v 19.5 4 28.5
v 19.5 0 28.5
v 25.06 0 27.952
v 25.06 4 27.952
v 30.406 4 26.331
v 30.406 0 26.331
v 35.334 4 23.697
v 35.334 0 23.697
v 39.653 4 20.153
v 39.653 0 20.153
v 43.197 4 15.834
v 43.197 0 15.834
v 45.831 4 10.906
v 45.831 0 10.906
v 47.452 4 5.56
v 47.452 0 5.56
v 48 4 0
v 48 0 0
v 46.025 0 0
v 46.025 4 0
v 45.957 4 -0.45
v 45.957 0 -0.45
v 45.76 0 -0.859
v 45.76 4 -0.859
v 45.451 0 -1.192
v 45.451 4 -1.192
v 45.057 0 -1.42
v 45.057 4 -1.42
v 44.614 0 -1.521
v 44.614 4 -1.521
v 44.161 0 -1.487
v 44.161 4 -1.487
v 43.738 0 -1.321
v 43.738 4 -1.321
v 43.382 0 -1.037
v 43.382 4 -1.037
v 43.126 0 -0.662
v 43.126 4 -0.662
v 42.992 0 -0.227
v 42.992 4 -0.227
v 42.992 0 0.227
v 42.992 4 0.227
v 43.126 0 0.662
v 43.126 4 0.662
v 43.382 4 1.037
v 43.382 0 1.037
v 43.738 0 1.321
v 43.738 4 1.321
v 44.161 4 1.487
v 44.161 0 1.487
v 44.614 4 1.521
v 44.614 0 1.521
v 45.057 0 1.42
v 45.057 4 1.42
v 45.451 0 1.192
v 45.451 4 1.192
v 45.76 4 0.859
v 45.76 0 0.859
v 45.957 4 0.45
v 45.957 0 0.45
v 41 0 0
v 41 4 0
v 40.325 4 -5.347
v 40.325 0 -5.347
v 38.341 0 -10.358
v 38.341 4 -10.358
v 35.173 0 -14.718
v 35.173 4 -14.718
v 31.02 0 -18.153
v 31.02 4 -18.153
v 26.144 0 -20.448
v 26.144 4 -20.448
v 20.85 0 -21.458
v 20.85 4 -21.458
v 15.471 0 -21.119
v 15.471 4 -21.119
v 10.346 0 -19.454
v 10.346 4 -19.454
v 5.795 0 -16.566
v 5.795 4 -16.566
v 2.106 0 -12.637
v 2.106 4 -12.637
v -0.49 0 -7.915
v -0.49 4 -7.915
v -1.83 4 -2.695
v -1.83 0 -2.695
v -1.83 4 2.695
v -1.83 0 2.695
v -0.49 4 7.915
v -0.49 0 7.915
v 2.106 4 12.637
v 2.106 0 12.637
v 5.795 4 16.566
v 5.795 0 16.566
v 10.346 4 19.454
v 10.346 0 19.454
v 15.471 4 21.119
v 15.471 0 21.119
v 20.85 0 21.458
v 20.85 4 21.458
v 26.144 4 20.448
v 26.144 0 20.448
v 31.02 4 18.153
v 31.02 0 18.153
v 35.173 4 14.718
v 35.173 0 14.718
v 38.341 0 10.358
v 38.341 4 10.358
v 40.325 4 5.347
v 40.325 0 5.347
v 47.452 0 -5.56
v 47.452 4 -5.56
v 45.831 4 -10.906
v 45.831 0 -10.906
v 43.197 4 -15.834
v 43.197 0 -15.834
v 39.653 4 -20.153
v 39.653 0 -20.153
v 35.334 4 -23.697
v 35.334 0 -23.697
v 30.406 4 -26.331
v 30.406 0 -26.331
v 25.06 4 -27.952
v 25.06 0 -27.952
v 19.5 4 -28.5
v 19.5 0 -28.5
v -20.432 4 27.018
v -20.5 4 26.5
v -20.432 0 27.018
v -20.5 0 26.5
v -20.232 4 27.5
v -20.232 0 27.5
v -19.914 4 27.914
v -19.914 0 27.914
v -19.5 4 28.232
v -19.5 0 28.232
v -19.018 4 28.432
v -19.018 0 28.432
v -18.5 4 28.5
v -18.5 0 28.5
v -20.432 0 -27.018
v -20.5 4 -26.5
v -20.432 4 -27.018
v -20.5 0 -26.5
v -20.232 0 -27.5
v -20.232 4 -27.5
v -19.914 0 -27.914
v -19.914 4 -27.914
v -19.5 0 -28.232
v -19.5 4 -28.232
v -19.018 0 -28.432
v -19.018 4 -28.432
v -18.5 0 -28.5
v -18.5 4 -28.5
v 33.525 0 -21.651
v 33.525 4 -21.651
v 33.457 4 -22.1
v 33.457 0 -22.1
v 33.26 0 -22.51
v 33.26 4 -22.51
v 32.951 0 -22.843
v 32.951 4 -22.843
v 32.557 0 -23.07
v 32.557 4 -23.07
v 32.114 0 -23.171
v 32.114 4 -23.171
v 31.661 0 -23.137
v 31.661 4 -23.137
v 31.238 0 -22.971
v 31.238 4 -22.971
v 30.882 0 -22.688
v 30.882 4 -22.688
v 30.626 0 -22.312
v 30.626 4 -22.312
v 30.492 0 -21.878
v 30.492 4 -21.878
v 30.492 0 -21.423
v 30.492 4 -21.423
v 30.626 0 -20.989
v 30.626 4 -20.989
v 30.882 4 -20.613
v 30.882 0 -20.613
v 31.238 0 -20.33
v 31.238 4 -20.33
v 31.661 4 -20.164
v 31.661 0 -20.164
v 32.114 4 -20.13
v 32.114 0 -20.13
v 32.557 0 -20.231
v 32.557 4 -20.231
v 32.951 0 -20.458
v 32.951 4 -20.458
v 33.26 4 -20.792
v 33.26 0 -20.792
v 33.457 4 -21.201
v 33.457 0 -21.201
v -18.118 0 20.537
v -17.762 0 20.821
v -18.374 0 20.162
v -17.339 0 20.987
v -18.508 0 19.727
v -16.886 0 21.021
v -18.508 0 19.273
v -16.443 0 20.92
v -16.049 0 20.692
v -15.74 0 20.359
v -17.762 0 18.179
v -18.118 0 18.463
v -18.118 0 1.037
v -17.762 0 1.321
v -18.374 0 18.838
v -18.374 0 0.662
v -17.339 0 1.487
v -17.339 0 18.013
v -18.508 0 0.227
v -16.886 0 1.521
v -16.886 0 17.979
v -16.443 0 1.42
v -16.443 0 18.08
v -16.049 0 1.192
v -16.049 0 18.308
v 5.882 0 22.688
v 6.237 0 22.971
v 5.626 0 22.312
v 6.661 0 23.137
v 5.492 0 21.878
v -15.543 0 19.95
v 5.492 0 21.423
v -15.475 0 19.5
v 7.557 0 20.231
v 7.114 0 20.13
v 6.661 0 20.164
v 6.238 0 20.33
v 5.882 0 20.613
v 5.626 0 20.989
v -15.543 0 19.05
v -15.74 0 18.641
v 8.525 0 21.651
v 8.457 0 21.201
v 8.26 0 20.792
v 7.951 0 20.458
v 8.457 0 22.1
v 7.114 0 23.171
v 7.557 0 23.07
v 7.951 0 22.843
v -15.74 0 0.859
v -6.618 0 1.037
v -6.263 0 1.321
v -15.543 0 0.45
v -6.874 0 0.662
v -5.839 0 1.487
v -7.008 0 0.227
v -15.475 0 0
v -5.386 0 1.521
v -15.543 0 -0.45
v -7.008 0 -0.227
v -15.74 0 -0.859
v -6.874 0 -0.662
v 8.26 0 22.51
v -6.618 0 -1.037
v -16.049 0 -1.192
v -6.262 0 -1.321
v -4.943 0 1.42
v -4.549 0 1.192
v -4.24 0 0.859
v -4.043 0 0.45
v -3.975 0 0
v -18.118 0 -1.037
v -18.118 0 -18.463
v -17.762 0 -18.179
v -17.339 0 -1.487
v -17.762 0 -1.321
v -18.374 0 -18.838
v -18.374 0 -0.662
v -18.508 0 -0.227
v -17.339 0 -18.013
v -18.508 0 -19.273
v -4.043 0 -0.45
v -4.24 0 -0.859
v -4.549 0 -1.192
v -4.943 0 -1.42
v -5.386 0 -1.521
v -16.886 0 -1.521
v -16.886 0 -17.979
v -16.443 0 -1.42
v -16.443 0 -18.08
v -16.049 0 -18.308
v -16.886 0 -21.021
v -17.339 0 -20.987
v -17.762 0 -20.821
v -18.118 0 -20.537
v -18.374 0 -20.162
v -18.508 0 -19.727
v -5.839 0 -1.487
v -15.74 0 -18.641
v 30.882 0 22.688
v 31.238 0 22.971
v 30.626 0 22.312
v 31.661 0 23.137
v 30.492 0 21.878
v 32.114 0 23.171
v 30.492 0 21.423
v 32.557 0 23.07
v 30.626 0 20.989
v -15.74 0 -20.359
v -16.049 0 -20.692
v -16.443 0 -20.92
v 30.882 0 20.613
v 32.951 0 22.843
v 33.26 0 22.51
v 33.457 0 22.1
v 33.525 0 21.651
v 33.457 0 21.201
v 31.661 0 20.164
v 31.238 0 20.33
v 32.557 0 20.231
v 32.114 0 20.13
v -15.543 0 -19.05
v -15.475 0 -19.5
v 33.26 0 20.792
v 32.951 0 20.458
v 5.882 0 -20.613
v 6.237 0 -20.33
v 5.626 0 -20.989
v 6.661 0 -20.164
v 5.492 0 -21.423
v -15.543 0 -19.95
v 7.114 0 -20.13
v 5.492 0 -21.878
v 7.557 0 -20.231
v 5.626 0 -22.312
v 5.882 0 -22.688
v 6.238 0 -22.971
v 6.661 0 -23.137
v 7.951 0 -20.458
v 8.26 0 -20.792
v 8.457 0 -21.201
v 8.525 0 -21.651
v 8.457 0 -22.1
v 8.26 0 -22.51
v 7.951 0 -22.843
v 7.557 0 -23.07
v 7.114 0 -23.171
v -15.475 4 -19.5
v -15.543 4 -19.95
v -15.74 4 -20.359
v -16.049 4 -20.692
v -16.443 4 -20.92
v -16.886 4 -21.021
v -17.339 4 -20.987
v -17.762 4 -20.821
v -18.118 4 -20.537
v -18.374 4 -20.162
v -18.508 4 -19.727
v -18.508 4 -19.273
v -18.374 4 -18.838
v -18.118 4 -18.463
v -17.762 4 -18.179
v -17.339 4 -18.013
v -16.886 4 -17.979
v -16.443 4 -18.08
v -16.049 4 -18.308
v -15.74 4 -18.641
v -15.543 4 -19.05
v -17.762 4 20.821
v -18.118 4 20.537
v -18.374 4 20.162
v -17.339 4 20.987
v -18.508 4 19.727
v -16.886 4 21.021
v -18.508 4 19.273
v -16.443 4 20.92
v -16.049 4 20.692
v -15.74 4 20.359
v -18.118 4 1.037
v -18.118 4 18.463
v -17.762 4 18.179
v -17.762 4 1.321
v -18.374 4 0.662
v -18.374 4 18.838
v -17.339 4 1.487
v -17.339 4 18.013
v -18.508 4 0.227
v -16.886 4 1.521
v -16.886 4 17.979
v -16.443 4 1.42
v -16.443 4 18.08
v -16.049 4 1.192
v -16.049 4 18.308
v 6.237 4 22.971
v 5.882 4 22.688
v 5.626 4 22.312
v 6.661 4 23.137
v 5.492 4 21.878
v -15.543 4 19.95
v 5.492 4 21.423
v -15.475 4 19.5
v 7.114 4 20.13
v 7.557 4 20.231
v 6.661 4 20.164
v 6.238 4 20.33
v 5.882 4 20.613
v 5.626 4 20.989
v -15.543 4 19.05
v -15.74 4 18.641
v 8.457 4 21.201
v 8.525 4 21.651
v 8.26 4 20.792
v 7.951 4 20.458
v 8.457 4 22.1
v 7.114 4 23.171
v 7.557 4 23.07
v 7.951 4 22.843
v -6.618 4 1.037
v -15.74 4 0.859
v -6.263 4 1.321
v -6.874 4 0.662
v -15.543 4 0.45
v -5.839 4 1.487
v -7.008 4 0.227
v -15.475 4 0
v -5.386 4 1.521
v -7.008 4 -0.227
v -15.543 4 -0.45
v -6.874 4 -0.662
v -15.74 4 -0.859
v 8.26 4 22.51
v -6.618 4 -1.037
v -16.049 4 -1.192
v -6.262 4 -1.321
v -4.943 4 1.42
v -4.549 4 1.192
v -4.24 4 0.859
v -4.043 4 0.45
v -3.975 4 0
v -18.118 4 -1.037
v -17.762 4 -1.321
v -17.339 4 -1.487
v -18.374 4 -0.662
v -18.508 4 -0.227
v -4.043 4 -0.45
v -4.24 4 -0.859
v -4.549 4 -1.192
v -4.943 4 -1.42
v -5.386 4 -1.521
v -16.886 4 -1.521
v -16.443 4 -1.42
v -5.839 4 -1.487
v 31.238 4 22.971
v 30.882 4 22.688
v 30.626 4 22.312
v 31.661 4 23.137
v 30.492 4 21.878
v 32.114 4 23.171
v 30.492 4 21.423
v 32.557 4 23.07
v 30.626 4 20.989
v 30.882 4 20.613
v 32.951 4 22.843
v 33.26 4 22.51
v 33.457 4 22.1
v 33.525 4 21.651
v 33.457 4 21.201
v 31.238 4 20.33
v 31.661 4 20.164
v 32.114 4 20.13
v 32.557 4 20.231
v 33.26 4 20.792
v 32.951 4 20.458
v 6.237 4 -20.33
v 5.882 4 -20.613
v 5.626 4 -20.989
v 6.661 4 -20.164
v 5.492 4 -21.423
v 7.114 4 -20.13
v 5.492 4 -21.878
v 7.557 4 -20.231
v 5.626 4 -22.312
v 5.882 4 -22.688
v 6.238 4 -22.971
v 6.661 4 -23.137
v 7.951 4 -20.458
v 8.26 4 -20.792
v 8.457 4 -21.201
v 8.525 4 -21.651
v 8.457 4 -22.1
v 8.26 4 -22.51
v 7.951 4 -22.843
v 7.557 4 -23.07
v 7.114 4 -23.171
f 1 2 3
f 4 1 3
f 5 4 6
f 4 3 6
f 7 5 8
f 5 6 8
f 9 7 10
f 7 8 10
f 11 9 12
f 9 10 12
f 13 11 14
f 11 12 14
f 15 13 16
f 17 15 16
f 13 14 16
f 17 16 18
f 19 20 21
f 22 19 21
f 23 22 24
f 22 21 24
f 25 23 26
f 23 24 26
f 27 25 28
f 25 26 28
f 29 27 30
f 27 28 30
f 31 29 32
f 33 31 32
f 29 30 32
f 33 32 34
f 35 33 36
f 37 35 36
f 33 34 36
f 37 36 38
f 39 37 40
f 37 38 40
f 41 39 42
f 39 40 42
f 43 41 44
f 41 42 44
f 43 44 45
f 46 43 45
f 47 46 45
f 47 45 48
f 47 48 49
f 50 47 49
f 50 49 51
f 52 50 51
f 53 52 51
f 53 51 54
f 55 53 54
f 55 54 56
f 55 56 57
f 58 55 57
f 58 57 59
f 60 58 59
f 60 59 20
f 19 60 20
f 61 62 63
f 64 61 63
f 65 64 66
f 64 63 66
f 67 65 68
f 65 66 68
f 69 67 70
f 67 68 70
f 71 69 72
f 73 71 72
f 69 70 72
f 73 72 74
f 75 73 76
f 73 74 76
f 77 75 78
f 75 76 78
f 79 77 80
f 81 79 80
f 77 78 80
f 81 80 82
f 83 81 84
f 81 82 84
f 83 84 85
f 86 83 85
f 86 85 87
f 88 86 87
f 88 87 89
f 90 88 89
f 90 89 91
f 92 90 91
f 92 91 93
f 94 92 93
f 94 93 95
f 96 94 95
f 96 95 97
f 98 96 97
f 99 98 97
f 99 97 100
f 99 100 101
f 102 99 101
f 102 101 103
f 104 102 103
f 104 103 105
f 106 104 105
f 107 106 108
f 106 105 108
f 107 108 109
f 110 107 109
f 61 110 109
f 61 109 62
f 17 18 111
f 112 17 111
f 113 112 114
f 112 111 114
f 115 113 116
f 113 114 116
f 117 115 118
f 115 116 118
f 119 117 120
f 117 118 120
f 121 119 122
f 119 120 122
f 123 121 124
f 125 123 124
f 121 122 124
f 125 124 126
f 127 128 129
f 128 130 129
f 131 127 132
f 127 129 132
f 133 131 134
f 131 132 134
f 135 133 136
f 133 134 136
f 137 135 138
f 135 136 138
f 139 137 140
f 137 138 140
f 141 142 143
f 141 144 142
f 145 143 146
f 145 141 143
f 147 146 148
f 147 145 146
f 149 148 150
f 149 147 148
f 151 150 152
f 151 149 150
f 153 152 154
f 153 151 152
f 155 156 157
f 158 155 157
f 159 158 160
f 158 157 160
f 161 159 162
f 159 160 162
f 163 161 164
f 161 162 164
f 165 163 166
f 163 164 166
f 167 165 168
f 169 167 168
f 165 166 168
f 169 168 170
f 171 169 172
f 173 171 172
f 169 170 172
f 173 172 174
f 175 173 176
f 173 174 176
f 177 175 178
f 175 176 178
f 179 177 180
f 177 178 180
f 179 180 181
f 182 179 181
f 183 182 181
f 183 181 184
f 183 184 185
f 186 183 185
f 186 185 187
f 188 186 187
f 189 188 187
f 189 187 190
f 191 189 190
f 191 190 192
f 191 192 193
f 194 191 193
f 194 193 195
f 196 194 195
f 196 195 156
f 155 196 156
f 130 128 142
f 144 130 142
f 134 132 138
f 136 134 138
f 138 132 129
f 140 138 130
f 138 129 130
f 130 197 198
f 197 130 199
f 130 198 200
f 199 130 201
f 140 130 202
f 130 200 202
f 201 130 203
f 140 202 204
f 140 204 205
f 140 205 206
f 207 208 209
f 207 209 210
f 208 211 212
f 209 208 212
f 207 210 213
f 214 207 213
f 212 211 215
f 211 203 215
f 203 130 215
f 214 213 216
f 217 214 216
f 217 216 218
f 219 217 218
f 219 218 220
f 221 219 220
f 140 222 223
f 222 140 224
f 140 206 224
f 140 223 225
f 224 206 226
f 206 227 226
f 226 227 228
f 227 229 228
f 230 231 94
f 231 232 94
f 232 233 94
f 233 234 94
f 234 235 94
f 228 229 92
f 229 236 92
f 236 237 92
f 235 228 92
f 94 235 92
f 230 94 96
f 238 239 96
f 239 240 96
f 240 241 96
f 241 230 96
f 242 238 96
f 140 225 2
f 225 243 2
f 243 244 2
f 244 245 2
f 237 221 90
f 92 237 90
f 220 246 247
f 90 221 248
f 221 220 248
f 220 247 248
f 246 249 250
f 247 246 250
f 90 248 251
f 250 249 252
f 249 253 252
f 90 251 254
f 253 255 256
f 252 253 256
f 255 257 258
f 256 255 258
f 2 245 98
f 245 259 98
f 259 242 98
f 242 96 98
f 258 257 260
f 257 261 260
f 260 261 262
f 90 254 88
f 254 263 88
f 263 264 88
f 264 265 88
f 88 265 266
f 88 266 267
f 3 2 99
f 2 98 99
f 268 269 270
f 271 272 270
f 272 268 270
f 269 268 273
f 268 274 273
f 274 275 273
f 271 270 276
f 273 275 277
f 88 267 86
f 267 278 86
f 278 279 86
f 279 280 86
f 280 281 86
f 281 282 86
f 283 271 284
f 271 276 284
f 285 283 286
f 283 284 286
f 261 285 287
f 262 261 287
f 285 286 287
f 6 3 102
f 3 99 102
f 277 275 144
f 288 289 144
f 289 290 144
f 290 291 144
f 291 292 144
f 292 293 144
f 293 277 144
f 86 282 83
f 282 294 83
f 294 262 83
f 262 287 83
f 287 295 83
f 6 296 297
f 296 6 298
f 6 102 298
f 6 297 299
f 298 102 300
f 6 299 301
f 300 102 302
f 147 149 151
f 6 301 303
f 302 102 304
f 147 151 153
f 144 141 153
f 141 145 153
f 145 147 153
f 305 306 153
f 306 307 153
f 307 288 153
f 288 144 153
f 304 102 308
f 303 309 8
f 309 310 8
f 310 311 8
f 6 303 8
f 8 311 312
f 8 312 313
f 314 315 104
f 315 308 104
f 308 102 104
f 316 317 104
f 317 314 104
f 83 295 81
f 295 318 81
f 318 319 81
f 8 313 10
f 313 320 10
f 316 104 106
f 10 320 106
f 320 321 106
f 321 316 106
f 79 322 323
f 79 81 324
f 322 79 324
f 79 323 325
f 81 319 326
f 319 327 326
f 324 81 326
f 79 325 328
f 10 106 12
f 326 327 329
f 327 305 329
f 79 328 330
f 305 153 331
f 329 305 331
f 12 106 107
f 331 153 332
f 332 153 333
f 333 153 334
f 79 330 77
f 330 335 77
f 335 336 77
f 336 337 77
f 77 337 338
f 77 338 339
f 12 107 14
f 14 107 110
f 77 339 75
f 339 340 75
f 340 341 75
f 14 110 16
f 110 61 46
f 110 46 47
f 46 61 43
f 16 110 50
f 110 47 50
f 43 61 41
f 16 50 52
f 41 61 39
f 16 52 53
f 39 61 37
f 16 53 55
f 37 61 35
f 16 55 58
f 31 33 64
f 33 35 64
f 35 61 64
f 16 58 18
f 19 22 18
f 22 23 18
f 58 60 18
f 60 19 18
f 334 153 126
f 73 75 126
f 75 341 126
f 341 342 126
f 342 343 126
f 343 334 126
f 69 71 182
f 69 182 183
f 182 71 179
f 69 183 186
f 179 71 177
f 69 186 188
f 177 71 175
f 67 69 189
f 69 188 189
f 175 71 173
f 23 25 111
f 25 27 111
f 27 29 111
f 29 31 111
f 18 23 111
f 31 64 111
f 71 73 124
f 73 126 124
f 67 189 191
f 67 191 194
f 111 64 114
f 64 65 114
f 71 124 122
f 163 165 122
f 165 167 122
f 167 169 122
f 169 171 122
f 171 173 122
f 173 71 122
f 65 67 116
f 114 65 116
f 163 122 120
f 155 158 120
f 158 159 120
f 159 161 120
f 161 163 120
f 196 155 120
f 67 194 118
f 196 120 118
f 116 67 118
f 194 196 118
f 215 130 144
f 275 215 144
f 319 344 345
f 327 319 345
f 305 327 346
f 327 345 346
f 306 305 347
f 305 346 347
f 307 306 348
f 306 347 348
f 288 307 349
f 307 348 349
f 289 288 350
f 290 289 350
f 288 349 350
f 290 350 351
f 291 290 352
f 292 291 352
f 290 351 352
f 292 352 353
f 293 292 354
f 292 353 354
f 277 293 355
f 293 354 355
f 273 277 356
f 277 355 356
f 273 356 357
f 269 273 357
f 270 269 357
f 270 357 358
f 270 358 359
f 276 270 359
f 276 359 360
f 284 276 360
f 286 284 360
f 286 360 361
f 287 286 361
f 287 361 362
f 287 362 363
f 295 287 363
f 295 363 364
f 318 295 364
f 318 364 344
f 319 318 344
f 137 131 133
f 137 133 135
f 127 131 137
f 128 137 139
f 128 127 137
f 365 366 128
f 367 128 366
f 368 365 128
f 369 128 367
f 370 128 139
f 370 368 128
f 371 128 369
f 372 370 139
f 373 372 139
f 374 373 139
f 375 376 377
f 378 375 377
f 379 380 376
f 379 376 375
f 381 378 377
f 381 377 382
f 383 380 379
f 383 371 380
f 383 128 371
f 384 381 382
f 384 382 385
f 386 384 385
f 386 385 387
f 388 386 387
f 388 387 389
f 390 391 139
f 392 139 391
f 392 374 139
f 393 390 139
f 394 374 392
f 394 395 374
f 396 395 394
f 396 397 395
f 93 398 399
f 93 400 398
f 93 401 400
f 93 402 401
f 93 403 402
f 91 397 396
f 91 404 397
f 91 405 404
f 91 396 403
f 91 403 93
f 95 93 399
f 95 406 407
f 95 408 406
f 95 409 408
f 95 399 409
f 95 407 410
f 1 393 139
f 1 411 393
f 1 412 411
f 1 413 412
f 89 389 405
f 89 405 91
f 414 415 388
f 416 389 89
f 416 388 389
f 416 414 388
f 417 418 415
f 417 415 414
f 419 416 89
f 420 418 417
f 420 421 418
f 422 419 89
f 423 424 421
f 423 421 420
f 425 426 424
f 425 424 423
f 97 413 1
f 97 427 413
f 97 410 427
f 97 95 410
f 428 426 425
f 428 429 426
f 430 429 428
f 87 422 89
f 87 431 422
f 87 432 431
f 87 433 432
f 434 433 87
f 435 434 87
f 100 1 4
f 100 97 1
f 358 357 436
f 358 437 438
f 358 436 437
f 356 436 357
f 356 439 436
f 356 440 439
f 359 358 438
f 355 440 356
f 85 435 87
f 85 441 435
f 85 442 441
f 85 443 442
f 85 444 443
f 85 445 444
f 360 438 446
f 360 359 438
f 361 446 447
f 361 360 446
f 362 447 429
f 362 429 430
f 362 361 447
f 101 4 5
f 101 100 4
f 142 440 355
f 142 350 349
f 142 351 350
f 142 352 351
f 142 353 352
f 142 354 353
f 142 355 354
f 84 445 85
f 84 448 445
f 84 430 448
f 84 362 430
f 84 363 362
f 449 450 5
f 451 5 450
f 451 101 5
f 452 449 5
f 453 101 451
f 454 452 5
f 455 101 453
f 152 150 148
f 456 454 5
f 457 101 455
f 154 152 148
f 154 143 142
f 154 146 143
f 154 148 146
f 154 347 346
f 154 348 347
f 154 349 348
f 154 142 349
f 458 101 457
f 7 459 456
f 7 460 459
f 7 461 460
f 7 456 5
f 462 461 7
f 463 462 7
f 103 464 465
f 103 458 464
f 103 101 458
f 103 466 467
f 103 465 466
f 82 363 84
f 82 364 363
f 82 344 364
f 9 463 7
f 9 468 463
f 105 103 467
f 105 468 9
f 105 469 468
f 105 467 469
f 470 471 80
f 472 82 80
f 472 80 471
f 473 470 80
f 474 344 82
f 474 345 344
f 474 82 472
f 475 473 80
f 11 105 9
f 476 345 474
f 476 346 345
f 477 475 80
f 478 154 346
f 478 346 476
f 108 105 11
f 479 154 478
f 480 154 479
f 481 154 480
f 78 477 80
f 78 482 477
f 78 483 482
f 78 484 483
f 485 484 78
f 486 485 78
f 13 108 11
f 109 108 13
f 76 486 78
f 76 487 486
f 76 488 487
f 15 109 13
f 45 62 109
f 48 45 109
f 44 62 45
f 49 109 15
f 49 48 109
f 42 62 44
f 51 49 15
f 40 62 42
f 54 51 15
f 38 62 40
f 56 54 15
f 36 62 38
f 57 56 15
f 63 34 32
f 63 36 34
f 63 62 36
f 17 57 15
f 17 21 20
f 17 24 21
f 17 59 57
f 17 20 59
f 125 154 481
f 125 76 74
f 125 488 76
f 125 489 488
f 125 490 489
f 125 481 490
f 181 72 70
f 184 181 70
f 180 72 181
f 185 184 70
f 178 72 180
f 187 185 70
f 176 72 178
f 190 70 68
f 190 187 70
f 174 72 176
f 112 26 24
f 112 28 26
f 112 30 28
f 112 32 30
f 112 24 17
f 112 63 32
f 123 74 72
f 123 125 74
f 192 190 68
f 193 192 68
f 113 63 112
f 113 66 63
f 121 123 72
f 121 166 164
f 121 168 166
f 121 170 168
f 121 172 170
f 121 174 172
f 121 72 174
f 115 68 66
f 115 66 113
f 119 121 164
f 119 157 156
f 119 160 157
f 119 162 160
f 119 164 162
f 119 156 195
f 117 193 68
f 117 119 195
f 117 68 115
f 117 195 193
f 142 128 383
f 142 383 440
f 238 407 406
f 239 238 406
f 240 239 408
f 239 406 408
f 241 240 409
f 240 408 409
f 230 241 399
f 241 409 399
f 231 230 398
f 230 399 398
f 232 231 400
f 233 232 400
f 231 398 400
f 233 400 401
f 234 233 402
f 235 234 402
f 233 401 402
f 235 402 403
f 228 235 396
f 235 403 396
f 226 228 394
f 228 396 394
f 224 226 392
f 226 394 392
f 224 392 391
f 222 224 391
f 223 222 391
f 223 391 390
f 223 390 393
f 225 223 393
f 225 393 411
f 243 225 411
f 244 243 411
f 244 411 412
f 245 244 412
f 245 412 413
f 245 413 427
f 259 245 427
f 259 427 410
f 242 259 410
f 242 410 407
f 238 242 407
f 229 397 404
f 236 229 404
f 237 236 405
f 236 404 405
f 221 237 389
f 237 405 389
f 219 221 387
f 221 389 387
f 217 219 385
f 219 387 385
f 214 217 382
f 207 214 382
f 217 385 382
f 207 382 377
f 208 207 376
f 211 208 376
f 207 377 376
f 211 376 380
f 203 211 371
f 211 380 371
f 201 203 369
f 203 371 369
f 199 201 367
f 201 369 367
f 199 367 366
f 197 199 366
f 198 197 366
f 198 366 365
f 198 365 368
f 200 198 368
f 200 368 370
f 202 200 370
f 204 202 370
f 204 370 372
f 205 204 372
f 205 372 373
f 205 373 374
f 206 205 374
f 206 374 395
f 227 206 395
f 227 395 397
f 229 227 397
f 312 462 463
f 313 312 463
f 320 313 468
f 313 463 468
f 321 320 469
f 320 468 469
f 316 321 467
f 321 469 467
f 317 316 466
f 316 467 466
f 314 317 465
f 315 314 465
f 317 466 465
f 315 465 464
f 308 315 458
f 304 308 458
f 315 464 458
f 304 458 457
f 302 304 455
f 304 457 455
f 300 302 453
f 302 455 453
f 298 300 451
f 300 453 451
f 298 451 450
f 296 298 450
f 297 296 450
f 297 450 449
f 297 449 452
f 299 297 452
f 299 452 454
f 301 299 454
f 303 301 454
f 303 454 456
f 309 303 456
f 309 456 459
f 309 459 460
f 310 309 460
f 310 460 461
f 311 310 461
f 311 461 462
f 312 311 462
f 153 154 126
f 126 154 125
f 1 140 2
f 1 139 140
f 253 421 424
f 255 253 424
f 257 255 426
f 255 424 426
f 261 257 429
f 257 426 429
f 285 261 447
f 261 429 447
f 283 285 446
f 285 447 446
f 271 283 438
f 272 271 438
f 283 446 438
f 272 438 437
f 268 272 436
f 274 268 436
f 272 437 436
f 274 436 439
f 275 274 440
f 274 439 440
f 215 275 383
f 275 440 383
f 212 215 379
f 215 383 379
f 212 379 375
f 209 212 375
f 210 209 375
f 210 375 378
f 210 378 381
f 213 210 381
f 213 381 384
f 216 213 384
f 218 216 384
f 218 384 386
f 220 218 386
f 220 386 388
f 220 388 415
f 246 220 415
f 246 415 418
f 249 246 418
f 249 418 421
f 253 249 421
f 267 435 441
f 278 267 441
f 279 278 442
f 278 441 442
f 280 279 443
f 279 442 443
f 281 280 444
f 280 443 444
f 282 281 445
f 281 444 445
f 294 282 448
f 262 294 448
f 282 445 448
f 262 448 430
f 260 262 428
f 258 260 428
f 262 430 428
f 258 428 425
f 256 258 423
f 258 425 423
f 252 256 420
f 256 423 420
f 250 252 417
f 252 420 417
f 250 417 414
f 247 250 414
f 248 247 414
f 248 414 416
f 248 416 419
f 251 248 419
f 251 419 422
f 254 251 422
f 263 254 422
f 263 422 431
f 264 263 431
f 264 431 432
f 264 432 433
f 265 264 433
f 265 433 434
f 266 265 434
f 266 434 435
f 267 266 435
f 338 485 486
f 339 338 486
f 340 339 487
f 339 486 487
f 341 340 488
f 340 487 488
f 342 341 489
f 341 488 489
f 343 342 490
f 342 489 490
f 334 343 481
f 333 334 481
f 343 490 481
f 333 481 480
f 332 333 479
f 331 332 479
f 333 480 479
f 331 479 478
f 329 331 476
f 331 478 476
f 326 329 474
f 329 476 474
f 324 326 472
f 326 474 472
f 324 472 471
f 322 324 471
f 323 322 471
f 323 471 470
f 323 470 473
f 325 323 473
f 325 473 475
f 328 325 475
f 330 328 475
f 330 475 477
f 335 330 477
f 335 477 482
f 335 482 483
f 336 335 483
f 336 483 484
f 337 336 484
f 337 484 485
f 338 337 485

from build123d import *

# Parameters (mm, degrees)
EXTRUDE_1_DEPTH     = 4
SKETCH_2_R          = 21.5
CUT_EXTRUDE_1_DEPTH = 5
SKETCH_4_R          = 1.525
CUT_EXTRUDE_3_DEPTH = 5
SKETCH_5_R          = 1.525
CUT_EXTRUDE_4_DEPTH = 5
SKETCH_6_W          = 1
SKETCH_6_H          = 57
EXTRUDE_2_DEPTH     = 4
FILLET_1_R          = 2


with BuildPart() as part:
    # 草图1 → 凸台-拉伸1 (new body)
    with BuildSketch(Plane(origin=(0, 0, 0), x_dir=(1, 0, 0), z_dir=(0, 1, 0))):
        with BuildLine():
            ThreePointArc((19.5, 28.5), (-9, 0), (19.5, -28.5))
            Line((19.5, -28.5), (19.5, 28.5))
        make_face()
        with BuildLine():
            Line((19.5, 28.5), (19.5, -28.5))
            ThreePointArc((19.5, -28.5), (39.652543264, -20.152543264), (48, 0))
            ThreePointArc((48, 0), (39.652543264, 20.152543264), (19.5, 28.5))
        make_face()
        with BuildLine():
            Line((-19.5, 28.5), (-19.5, -28.5))
            Line((-19.5, -28.5), (19.5, -28.5))
            ThreePointArc((19.5, -28.5), (-9, 0), (19.5, 28.5))
            Line((19.5, 28.5), (-19.5, 28.5))
        make_face()
    extrude(amount=EXTRUDE_1_DEPTH)

    # 草图2 → 切除-拉伸1 (cut, through all)
    with BuildSketch(Plane(origin=(0, 4, 0), x_dir=(1, 0, 0), z_dir=(0, 1, 0))):
        with Locations((19.5, 0)):
            Circle(SKETCH_2_R)
    extrude(amount=-CUT_EXTRUDE_1_DEPTH, mode=Mode.SUBTRACT)

    # 草图4 → 切除-拉伸3 (cut, through all)
    with BuildSketch(Plane(origin=(0, 4, 0), x_dir=(1, 0, 0), z_dir=(0, 1, 0))):
        with Locations((-5.5, 0)):
            Circle(SKETCH_4_R)
        with Locations((7, 21.650635095)):
            Circle(SKETCH_4_R)
        with Locations((32, 21.650635095)):
            Circle(SKETCH_4_R)
        with Locations((44.5, 0)):
            Circle(SKETCH_4_R)
        with Locations((32, -21.650635095)):
            Circle(SKETCH_4_R)
        with Locations((7, -21.650635095)):
            Circle(SKETCH_4_R)
    extrude(amount=-CUT_EXTRUDE_3_DEPTH, mode=Mode.SUBTRACT)

    # 草图5 → 切除-拉伸4 (cut, through all)
    with BuildSketch(Plane(origin=(0, 4, 0), x_dir=(1, 0, 0), z_dir=(0, 1, 0))):
        with Locations((-17, 19.5)):
            Circle(SKETCH_5_R)
        with Locations((-17, 0)):
            Circle(SKETCH_5_R)
        with Locations((-17, -19.5)):
            Circle(SKETCH_5_R)
    extrude(amount=-CUT_EXTRUDE_4_DEPTH, mode=Mode.SUBTRACT)

    # 草图6 → 凸台-拉伸2 (add)
    with BuildSketch(Plane(origin=(0, 4, 0), x_dir=(1, 0, 0), z_dir=(0, 1, 0))):
        with Locations((-20, 0)):
            Rectangle(SKETCH_6_W, SKETCH_6_H)
    extrude(amount=-EXTRUDE_2_DEPTH)

    # 圆角1
    fillet_1_edges = [part.edges().sort_by_distance(p)[0] for p in [
        (-20.5, 2, 28.5),
        (-20.5, 2, -28.5),
    ]]
    fillet(fillet_1_edges, radius=FILLET_1_R)


solid = part.part
